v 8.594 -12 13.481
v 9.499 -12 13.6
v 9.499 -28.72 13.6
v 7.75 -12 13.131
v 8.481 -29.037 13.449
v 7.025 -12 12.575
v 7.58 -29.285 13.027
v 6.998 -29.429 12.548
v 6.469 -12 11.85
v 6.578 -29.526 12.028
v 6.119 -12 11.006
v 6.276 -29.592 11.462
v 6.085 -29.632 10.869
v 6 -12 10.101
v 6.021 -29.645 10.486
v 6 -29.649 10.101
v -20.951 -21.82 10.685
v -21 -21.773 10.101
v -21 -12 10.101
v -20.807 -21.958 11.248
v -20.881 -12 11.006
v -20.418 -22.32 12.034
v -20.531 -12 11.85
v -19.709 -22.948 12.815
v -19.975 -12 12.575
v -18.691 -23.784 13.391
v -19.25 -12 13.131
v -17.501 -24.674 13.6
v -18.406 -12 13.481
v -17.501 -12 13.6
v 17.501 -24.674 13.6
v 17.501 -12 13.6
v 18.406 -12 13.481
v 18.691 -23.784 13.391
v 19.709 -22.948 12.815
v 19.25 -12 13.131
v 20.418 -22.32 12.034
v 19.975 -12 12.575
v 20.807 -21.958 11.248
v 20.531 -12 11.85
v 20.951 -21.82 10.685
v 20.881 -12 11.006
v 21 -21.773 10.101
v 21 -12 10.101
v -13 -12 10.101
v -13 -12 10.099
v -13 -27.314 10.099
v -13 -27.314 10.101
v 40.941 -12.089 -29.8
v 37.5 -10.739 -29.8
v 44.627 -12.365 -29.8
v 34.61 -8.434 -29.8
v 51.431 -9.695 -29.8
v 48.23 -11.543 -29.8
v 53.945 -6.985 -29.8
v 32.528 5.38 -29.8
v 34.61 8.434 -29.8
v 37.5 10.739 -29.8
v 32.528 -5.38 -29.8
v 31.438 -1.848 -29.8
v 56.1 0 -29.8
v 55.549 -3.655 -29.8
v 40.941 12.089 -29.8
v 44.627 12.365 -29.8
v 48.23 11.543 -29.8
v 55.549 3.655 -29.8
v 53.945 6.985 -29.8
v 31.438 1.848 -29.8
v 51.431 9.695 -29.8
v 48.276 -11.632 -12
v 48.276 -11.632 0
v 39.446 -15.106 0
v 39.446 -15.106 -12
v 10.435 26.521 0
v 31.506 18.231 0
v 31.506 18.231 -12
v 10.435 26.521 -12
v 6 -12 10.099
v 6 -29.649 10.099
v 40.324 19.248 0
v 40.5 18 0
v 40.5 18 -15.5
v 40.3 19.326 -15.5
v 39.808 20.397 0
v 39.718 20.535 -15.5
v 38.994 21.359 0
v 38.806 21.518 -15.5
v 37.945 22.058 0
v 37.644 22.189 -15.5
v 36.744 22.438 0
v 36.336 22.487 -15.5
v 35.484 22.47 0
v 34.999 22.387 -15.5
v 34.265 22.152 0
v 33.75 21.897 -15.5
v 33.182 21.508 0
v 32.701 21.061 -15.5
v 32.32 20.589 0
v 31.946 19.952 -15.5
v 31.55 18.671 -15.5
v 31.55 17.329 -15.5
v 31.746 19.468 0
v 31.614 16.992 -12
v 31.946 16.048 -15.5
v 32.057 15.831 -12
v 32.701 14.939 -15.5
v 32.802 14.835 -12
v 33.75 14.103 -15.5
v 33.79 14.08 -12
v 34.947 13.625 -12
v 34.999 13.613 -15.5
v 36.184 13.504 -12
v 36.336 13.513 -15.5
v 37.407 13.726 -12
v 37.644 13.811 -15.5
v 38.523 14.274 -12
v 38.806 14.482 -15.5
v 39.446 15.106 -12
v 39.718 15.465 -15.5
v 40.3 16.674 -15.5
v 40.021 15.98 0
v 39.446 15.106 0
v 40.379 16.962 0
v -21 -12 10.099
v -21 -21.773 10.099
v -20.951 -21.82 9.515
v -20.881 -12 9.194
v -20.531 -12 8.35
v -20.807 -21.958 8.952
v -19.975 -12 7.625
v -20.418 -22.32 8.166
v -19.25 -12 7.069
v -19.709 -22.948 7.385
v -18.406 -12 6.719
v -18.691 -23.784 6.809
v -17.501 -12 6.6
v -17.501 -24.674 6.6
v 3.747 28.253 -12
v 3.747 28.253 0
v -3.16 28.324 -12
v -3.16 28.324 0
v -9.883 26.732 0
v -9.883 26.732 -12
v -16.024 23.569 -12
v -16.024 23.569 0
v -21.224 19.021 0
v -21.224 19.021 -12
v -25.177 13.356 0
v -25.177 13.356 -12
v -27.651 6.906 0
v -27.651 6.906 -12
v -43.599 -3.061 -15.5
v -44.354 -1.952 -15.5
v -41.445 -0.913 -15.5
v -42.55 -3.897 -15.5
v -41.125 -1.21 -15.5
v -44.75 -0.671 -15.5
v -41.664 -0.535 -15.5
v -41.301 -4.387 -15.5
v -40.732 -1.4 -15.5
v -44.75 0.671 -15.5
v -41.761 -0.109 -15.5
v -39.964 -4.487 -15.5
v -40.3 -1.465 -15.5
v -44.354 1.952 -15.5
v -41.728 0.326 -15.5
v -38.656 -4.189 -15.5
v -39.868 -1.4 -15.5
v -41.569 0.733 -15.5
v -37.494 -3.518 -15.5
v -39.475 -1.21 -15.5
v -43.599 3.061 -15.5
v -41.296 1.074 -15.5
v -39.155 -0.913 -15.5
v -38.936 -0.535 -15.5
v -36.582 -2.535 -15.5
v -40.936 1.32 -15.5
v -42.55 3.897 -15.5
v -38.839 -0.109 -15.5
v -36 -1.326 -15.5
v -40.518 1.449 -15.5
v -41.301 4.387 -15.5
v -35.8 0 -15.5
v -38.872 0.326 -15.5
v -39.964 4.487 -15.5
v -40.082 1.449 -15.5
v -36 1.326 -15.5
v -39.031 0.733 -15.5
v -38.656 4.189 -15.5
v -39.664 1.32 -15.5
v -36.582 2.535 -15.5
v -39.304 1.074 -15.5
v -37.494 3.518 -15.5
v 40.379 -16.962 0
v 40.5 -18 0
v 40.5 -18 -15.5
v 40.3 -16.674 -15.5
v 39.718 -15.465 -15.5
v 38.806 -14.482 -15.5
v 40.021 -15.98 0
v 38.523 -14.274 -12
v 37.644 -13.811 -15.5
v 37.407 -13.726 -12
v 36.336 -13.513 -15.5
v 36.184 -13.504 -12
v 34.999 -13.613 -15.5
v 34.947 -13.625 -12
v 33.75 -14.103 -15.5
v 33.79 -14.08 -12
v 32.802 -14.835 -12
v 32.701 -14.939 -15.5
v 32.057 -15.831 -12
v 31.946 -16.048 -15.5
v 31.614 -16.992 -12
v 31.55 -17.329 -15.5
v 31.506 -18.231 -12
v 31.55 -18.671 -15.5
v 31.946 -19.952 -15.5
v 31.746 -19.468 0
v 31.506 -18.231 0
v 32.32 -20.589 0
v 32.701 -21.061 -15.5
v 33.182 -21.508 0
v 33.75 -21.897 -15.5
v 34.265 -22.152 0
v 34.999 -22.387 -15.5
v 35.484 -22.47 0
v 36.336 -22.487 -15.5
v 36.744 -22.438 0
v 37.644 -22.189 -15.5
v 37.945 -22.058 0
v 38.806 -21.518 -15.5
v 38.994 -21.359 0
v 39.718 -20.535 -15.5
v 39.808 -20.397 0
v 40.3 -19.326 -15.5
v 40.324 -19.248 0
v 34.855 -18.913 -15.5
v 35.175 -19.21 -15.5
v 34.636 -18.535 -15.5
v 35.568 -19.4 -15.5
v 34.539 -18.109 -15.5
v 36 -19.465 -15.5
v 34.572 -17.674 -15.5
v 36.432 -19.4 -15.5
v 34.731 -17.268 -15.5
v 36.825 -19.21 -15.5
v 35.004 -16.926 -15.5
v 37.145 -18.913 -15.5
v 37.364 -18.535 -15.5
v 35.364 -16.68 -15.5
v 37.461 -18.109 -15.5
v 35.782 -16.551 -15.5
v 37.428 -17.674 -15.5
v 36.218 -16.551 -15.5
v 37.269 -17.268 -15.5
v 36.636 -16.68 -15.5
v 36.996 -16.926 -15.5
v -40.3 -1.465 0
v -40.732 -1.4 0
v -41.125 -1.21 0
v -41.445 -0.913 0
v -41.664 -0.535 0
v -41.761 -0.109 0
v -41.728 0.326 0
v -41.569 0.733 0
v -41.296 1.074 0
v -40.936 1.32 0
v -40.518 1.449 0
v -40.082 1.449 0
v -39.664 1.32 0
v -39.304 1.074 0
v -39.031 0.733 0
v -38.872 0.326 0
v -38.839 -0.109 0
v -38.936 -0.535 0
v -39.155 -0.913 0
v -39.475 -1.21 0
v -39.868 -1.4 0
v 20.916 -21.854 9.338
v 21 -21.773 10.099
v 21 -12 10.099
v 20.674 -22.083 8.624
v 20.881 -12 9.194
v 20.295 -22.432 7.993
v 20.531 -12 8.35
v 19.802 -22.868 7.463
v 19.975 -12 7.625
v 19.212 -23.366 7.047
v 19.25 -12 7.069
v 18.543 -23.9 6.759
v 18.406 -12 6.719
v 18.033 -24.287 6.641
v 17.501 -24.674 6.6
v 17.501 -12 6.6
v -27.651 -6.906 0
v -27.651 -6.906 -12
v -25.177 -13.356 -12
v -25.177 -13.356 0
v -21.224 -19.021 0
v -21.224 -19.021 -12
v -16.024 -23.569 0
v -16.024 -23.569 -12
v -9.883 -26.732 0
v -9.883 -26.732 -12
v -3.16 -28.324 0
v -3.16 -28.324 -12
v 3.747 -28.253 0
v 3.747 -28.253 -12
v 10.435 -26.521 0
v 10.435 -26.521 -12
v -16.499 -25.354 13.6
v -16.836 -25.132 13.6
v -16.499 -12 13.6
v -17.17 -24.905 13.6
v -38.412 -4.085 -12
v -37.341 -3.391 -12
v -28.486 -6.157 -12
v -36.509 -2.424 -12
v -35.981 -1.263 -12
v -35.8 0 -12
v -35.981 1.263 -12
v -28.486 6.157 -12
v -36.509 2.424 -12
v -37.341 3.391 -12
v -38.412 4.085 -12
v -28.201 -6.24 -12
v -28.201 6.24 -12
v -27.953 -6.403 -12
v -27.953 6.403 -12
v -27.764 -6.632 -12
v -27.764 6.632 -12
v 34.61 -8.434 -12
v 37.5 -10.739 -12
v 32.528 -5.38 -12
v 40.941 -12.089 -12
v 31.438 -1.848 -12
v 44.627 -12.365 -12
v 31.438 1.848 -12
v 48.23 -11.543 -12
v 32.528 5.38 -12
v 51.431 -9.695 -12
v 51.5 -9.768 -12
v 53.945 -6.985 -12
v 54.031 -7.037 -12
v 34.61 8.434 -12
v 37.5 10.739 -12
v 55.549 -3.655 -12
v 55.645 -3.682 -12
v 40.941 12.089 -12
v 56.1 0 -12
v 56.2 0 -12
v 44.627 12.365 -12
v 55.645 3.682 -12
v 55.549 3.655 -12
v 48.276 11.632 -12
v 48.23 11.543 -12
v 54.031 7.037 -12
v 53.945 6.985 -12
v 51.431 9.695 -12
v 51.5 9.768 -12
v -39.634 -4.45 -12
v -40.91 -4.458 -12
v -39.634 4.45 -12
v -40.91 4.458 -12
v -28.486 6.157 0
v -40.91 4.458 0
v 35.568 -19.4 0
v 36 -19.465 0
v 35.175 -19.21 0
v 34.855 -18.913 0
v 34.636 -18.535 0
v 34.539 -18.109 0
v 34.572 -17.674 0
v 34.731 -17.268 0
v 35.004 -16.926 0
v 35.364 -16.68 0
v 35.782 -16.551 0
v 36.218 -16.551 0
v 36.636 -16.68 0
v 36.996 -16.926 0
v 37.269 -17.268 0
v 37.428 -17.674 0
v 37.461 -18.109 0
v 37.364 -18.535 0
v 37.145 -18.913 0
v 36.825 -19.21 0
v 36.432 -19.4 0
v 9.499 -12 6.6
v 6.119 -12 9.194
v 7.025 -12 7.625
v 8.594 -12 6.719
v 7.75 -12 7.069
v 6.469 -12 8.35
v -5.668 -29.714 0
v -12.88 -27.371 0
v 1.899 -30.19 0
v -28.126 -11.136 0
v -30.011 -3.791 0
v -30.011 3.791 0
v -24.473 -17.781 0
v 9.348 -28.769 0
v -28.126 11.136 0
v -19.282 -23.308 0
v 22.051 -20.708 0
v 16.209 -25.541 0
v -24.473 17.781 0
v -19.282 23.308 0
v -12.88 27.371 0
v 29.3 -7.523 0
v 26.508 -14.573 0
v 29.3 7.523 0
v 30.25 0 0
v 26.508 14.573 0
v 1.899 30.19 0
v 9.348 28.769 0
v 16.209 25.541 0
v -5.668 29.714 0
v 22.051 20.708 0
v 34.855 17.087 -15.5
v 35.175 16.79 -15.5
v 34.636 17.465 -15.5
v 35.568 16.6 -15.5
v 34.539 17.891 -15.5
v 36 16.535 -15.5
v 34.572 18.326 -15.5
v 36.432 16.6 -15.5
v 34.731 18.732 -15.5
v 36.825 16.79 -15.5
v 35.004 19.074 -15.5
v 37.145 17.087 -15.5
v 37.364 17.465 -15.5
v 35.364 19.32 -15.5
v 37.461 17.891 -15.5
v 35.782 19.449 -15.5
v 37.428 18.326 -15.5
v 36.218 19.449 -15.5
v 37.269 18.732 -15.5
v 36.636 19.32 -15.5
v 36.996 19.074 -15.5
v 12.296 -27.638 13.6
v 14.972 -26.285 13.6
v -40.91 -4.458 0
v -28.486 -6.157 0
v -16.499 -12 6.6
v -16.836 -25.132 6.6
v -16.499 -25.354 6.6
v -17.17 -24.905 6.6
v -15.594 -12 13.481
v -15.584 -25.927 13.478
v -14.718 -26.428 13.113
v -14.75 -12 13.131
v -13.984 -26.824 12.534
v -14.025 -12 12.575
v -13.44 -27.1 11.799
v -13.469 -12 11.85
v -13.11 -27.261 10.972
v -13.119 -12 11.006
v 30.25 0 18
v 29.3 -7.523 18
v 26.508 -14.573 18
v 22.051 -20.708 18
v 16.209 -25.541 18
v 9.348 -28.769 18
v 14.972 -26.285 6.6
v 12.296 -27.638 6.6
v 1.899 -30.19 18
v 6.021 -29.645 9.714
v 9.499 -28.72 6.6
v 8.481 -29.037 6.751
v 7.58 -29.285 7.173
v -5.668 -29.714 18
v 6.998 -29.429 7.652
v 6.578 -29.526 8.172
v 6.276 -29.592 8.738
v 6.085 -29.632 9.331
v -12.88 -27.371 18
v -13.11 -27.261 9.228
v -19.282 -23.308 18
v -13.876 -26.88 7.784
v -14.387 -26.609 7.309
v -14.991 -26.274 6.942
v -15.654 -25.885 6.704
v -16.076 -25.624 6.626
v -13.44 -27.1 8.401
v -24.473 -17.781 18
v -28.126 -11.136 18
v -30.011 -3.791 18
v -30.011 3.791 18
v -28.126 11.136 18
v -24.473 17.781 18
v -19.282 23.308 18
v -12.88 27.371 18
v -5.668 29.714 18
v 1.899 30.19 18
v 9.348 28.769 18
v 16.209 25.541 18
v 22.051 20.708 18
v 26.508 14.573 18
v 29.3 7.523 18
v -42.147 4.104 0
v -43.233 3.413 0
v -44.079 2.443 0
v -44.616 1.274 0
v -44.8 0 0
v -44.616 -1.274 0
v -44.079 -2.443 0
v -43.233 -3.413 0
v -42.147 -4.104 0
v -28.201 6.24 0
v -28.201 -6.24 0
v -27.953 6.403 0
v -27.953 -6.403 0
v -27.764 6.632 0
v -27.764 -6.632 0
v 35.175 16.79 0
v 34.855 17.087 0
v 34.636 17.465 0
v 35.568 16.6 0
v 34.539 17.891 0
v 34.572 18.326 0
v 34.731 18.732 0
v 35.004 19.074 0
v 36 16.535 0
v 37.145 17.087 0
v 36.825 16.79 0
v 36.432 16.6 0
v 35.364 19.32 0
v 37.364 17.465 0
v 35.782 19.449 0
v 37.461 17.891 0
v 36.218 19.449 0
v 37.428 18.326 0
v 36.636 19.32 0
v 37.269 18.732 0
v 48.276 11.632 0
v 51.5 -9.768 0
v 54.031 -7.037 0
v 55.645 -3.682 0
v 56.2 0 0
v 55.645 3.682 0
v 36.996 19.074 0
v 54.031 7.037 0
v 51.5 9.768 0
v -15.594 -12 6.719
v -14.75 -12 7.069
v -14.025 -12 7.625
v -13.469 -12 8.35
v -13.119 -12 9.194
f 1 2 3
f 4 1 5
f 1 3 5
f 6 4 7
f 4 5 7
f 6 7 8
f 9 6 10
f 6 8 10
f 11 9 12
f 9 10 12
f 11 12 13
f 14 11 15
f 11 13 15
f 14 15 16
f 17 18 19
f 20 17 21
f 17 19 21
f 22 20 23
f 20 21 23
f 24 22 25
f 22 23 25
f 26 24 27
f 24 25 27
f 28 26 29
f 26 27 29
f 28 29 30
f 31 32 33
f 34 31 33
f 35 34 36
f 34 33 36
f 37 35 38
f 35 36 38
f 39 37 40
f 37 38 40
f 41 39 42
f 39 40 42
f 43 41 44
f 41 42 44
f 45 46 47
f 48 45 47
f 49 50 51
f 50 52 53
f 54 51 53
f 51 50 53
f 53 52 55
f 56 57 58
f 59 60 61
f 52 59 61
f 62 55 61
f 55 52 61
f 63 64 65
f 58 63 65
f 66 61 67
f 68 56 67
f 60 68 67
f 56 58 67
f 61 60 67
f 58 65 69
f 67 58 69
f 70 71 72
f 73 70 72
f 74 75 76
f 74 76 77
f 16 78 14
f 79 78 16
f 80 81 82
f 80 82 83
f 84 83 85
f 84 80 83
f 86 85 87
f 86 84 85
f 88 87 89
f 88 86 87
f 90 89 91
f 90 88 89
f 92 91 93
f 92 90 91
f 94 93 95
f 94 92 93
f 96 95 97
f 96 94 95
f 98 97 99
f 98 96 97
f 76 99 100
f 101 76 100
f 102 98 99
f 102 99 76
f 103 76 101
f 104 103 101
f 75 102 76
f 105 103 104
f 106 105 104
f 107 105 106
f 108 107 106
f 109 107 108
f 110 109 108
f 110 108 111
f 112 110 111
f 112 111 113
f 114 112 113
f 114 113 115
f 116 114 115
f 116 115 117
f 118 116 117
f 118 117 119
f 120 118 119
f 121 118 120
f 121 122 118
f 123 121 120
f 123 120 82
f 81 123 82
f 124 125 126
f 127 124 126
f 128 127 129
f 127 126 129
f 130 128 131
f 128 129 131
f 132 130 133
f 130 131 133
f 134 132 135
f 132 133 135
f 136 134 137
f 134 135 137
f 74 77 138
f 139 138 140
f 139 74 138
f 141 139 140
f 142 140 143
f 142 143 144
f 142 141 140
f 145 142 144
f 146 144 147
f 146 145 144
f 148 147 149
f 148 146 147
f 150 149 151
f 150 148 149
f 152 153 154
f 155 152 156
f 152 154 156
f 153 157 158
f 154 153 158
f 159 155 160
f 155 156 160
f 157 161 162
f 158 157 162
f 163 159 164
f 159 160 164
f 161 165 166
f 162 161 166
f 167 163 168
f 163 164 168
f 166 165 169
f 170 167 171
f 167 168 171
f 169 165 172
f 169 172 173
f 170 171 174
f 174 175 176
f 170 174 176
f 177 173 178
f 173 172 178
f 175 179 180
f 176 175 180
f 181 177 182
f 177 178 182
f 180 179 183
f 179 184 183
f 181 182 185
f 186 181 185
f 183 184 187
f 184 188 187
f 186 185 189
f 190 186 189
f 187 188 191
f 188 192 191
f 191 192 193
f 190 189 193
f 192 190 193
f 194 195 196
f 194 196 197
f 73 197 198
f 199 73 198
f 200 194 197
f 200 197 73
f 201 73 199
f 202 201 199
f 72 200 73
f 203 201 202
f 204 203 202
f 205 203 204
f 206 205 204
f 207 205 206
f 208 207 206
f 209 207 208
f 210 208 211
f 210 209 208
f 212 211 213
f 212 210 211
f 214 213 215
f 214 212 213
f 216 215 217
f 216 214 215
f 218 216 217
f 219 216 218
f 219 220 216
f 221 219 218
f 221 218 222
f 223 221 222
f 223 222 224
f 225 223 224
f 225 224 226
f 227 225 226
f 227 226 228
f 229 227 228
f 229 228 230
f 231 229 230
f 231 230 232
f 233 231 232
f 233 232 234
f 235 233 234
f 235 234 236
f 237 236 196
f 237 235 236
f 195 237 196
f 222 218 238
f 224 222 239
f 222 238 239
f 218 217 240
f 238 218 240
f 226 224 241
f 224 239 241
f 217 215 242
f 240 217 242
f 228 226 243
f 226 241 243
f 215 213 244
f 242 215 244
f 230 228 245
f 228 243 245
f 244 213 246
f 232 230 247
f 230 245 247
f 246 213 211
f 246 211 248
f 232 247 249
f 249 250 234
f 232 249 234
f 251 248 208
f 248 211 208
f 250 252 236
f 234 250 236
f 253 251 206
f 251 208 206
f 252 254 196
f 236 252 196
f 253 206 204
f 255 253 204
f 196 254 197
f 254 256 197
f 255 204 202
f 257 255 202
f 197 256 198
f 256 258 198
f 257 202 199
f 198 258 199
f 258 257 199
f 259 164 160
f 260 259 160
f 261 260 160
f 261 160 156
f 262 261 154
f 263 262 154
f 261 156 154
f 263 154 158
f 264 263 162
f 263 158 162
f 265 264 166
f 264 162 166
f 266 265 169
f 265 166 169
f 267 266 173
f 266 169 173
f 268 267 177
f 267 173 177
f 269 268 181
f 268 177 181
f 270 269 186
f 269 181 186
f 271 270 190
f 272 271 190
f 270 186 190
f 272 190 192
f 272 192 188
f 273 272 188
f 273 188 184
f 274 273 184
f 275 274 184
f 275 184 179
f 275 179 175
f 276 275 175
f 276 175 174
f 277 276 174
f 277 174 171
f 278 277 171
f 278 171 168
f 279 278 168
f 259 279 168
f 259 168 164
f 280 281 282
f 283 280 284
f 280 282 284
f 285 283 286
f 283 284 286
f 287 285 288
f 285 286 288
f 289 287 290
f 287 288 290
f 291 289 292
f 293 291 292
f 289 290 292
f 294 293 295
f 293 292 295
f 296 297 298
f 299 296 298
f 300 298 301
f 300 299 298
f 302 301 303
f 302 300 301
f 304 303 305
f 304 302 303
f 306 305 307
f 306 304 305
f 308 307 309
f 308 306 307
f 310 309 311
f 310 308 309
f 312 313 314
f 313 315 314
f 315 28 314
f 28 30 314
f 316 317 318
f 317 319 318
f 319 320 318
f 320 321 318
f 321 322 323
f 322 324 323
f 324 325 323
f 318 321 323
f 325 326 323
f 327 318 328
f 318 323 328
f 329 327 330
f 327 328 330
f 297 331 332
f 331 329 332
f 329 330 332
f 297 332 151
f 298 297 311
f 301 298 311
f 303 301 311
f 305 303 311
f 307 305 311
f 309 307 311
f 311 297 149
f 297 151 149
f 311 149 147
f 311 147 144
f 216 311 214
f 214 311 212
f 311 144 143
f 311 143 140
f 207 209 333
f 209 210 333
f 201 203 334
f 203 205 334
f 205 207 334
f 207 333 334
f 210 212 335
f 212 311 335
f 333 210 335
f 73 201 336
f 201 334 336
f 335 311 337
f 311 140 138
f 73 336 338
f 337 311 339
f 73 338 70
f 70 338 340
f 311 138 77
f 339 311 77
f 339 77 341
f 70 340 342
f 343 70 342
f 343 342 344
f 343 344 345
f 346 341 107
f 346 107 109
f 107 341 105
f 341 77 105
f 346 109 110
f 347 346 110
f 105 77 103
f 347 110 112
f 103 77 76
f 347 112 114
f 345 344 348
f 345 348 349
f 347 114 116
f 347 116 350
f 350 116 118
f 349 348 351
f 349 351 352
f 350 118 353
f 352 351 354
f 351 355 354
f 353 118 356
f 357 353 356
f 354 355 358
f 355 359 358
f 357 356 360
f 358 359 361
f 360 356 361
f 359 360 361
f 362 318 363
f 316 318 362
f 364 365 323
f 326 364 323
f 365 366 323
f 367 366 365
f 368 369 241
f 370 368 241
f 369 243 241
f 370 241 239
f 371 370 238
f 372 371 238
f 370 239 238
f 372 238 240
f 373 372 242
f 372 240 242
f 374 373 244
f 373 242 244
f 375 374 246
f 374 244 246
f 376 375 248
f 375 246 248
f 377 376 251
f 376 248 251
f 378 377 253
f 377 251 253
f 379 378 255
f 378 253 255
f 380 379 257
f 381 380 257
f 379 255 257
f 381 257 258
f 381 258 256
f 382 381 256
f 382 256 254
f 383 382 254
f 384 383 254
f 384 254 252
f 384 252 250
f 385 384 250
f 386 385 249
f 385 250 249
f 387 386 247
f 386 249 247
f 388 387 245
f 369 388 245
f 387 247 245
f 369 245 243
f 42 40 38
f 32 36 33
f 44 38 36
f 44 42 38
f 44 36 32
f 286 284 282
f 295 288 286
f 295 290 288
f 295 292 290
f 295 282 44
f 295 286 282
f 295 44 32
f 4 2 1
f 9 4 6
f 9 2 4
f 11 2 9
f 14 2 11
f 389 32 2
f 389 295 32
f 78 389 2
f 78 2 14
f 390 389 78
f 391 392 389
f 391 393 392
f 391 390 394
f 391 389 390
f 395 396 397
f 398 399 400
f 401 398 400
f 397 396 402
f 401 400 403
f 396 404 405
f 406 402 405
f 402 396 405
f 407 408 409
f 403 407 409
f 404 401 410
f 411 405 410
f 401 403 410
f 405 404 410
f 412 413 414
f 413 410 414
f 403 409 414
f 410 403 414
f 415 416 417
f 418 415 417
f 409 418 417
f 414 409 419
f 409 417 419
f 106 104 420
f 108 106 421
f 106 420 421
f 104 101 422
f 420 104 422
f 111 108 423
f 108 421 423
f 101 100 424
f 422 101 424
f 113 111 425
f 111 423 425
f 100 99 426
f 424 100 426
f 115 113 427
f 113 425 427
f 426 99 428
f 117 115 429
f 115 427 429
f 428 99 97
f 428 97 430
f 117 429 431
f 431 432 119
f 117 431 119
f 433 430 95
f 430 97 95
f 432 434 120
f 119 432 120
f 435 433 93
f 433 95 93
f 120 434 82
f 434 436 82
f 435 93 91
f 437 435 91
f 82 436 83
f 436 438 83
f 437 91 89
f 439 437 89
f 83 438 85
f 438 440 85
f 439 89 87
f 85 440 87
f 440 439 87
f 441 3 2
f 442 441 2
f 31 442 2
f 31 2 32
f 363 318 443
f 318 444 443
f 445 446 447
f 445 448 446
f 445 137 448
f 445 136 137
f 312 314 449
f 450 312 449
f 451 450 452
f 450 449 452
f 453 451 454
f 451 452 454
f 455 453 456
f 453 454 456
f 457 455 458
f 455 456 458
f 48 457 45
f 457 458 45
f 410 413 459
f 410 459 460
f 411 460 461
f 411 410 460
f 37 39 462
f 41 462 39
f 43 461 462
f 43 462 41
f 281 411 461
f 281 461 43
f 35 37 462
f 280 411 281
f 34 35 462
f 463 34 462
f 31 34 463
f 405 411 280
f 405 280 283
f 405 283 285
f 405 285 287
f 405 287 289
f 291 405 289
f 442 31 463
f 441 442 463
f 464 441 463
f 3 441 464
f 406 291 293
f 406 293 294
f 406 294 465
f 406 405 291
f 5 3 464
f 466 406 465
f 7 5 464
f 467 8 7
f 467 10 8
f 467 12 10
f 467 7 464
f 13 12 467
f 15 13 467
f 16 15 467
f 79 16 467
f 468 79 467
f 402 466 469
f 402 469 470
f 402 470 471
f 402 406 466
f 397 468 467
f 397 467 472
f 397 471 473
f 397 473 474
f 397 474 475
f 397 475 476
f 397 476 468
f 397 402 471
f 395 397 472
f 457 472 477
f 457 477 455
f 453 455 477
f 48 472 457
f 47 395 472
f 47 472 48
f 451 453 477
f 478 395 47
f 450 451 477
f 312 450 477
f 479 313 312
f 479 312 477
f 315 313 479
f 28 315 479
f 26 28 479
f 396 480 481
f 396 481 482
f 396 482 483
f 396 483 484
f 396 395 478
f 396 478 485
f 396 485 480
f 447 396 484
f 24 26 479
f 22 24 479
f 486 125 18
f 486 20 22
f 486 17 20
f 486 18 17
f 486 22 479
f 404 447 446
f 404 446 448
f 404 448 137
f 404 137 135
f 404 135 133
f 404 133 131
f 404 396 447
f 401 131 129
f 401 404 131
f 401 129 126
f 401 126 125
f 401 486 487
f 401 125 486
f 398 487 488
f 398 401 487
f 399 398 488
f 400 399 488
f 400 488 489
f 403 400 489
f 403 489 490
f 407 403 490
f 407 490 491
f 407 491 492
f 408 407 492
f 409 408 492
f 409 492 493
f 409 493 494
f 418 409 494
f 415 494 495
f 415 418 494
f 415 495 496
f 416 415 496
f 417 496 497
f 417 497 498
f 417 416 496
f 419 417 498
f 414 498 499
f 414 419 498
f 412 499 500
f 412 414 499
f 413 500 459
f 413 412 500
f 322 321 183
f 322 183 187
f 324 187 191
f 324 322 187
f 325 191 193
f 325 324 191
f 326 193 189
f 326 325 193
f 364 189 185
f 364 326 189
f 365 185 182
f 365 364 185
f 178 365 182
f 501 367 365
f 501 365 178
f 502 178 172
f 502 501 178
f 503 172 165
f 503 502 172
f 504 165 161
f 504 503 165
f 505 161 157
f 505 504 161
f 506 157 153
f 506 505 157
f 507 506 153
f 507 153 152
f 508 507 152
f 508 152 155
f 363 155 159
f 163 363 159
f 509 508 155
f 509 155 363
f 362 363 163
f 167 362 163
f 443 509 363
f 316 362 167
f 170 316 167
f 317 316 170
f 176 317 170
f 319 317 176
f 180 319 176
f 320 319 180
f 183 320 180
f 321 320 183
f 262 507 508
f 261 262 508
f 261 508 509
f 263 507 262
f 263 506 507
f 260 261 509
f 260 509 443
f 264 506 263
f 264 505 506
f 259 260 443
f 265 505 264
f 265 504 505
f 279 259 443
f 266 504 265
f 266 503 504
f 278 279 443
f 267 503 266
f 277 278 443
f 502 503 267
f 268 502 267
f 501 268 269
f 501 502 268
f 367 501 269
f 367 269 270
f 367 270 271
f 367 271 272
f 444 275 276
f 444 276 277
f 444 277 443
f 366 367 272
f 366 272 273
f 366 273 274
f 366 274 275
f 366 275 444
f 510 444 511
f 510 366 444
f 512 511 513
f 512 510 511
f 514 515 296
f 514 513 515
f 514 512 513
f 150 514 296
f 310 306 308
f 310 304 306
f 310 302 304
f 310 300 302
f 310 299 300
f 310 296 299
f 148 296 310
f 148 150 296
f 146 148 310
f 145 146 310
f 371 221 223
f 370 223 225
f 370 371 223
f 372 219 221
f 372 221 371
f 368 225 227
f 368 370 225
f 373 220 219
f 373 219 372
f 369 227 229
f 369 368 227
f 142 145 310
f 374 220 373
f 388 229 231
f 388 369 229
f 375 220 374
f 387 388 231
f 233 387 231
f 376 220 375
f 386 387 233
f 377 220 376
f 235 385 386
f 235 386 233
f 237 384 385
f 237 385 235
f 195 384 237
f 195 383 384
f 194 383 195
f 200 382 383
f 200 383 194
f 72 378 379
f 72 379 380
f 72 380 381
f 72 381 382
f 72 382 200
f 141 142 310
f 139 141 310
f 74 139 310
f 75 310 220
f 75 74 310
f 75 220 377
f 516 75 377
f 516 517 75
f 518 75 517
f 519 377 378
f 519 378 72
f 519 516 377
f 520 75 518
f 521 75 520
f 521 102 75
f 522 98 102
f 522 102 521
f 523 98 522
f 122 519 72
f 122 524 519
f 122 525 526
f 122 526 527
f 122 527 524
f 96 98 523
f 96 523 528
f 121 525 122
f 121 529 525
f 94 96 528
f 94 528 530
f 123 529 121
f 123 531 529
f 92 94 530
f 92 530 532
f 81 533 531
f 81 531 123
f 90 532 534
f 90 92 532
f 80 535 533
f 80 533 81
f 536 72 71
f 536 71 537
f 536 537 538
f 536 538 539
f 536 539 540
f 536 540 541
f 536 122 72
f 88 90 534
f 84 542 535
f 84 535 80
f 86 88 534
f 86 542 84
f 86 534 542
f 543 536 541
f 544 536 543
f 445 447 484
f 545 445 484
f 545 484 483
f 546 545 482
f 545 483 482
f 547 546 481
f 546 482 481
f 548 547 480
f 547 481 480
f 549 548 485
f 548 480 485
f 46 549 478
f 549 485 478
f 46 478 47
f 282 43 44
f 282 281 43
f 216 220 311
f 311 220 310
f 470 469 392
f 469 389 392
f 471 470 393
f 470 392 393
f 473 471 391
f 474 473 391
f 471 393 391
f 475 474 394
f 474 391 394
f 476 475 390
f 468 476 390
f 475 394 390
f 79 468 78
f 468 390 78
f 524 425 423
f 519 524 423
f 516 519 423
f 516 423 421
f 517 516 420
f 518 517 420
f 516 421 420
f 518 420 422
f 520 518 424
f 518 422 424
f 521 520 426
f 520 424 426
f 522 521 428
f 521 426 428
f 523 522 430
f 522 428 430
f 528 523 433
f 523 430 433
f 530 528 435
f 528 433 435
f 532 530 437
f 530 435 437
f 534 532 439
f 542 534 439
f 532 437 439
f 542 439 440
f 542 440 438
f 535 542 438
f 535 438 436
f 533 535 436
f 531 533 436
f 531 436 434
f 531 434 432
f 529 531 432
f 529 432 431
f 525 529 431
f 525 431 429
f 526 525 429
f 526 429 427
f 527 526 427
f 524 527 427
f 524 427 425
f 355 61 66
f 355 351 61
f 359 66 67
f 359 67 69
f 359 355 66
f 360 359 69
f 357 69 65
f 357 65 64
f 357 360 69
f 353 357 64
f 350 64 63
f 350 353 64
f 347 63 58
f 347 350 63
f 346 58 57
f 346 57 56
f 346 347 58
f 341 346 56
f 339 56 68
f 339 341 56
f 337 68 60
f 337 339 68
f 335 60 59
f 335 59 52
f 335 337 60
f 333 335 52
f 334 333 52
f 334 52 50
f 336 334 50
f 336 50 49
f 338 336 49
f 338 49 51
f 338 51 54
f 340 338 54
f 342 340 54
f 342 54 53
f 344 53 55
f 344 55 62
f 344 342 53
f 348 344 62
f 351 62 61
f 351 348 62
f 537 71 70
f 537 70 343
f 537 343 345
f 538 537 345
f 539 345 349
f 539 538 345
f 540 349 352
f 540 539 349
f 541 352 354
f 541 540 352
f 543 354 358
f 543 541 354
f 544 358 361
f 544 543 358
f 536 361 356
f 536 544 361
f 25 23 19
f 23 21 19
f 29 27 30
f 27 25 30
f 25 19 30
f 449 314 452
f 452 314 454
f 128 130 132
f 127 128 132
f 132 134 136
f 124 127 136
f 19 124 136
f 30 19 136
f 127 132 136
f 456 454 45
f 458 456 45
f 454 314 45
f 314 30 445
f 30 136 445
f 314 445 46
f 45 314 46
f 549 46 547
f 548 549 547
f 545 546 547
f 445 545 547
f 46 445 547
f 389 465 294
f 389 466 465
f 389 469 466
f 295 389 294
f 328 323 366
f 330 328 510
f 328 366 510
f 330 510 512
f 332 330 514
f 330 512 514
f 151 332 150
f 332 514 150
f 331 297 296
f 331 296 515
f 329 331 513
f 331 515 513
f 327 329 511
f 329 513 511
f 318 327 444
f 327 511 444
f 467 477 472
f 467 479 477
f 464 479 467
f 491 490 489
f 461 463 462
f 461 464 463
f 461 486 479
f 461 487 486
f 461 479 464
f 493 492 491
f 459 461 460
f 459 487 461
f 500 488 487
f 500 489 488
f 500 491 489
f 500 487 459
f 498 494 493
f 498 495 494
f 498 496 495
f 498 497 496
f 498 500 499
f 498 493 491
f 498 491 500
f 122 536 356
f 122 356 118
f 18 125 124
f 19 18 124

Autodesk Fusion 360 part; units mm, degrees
sketch "Sketch1" plane through (0, 0, 0) normal (0, 0, 1) x (1, 0, 0)
  circle A0 centre (0, 0) radius 30.25
  circle A1 centre (-40.3, 0) radius 4.5
  line L0 (-44.8, 0) -> (56.2, 0) construction
  circle A2 centre (36, 18) radius 4.5
  circle A3 centre (36, -18) radius 4.5
  line L1 (48.2764, -11.6322) -> (10.4348, -26.521)
  line L2 (48.2764, 11.6322) -> (10.4348, 26.521)
  circle A4 centre (43.7, 0) radius 12.4
  arc A5 (48.2764, -11.6322) -> (48.2764, 11.6322) centre (43.7, 0) ccw
  line L3 (-26, 0) -> (-26, 6.25) construction
  line L4 (-26, 6.25) -> (-27.8062, 6.25) construction
  line L5 (-28.4855, 6.1571) -> (-40.9096, 4.4585)
  line L6 (-28.4855, -6.1571) -> (-40.9096, -4.4585)
  arc A6 (10.4348, 26.521) -> (-27.6507, 6.9056) centre (0, 0) ccw
  arc A7 (-27.6507, -6.9056) -> (10.4348, -26.521) centre (0, 0) ccw
  arc A8 (-28.4855, 6.1571) -> (-27.6507, 6.9056) centre (-28.6209, 7.1479) ccw
  arc A9 (-27.6507, -6.9056) -> (-28.4855, -6.1571) centre (-28.6209, -7.1479) ccw
  line L7 (0, -32) -> (6, -32) construction
  line L8 (6, -32) -> (21, -32)
  line L9 (21, -32) -> (21, -12)
  line L10 (21, -12) -> (6, -12)
  line L11 (6, -12) -> (6, -32)
  line L12 (0, -32) -> (-13, -32) construction
  line L13 (-13, -32) -> (-21, -32)
  line L14 (-21, -32) -> (-21, -12)
  line L15 (-21, -12) -> (-13, -12)
  line L16 (-13, -12) -> (-13, -32)
  point P0 (-40.3, 0)
  dimension "d1" = 60.5
  dimension "d2" = 36
  dimension "d3" = 40.3
  dimension "d5" = 9
  dimension "d6" = 101
  dimension "d7" = 57
  dimension "d8" = 25
  dimension "d9" = 12.5
  dimension "d10" = 9
  dimension "d11" = 9
  dimension "d14" = 24.8
  dimension "d15" = 36
  dimension "d16" = 6.25
  dimension "d17" = 1
  dimension "d18" = 1
  dimension "d19" = 6
  dimension "d20" = 15
  dimension "d21" = 20
  dimension "d22" = 13
  dimension "d23" = 8
  dimension "d24" = 20
extrude "Extrude1" add sketch "Sketch1" along normal blind 18 contours A0 L2 L5 L6 A6 A7 A8 A9 L9 L10 L11 L14 L15 L16 | A0 L2 L5 A6 A8 | A0 L1 A7 L9 L10 L11 | A0 L1 A7 L11 | A0 L6 A7 A9 L14 | A0 A7 L11 L16 | A0 A7 L14 L16 | A7 L14 L15 L16 makes body 1 in component "Scanner"
extrude "Extrude2" cut sketch "Sketch1" along normal mid plane 7 from surface at 10.1 contours A0 L1 A7 L9 L10 L11 | A0 L1 L8 L9 L11 | A0 L1 A7 L11 | A0 A7 L14 L16 | A0 L13 L14 L16 | A7 L14 L15 L16 bodies 1 in component "Scanner"
fillet "Fillet1" radius 3.5 8 edges at (21, -16.8865, 6.6) (21, -16.8865, 13.6) (6, -20.8245, 13.6) (6, -20.8245, 6.6) (-13, -19.6571, 6.6) (-13, -19.6571, 13.6) (-21, -16.8865, 13.6) (-21, -16.8865, 6.6) on bodies 1 in component "Scanner"
extrude "Extrude1'" add sketch "Sketch1" against normal blind 12 separate body contours A0 L2 L5 L6 A6 A7 A8 A9 L9 L10 L11 L14 L15 L16 | A0 A2 A3 L1 L2 A5 L9 | A0 L1 L9 | A0 L1 A7 L9 L10 L11 | A0 A1 L5 L6 | A7 L14 L15 L16 | A4 makes body 2 in component "Base"
extrude "Extrude2'" add sketch "Sketch1" against normal blind 15.5 contours A2 L2 | A2 L2 | A1 | A3 L1 | A3 L1 bodies 2 in component "Base"
extrude "Extrude3" add sketch "Sketch1" against normal blind 17.8 from surface at -12 contours A4 bodies 2 in component "Base"
hole "Hole1" at (-40.3, 0, 0) at (36, 18, 0) at (36, -18, 0) direction (0, 0, -1) diameter 2.93 end up to surface (15.5 mm away) bodies 2 in component "Base"
component "Base" placed x (1, 0, 0) y (0, 1, 0) z (0, 0, 1) at (0, 0, 0)
component "Scanner" placed x (1, 0, 0) y (0, 1, 0) z (0, 0, 1) at (0, 0, 0)
